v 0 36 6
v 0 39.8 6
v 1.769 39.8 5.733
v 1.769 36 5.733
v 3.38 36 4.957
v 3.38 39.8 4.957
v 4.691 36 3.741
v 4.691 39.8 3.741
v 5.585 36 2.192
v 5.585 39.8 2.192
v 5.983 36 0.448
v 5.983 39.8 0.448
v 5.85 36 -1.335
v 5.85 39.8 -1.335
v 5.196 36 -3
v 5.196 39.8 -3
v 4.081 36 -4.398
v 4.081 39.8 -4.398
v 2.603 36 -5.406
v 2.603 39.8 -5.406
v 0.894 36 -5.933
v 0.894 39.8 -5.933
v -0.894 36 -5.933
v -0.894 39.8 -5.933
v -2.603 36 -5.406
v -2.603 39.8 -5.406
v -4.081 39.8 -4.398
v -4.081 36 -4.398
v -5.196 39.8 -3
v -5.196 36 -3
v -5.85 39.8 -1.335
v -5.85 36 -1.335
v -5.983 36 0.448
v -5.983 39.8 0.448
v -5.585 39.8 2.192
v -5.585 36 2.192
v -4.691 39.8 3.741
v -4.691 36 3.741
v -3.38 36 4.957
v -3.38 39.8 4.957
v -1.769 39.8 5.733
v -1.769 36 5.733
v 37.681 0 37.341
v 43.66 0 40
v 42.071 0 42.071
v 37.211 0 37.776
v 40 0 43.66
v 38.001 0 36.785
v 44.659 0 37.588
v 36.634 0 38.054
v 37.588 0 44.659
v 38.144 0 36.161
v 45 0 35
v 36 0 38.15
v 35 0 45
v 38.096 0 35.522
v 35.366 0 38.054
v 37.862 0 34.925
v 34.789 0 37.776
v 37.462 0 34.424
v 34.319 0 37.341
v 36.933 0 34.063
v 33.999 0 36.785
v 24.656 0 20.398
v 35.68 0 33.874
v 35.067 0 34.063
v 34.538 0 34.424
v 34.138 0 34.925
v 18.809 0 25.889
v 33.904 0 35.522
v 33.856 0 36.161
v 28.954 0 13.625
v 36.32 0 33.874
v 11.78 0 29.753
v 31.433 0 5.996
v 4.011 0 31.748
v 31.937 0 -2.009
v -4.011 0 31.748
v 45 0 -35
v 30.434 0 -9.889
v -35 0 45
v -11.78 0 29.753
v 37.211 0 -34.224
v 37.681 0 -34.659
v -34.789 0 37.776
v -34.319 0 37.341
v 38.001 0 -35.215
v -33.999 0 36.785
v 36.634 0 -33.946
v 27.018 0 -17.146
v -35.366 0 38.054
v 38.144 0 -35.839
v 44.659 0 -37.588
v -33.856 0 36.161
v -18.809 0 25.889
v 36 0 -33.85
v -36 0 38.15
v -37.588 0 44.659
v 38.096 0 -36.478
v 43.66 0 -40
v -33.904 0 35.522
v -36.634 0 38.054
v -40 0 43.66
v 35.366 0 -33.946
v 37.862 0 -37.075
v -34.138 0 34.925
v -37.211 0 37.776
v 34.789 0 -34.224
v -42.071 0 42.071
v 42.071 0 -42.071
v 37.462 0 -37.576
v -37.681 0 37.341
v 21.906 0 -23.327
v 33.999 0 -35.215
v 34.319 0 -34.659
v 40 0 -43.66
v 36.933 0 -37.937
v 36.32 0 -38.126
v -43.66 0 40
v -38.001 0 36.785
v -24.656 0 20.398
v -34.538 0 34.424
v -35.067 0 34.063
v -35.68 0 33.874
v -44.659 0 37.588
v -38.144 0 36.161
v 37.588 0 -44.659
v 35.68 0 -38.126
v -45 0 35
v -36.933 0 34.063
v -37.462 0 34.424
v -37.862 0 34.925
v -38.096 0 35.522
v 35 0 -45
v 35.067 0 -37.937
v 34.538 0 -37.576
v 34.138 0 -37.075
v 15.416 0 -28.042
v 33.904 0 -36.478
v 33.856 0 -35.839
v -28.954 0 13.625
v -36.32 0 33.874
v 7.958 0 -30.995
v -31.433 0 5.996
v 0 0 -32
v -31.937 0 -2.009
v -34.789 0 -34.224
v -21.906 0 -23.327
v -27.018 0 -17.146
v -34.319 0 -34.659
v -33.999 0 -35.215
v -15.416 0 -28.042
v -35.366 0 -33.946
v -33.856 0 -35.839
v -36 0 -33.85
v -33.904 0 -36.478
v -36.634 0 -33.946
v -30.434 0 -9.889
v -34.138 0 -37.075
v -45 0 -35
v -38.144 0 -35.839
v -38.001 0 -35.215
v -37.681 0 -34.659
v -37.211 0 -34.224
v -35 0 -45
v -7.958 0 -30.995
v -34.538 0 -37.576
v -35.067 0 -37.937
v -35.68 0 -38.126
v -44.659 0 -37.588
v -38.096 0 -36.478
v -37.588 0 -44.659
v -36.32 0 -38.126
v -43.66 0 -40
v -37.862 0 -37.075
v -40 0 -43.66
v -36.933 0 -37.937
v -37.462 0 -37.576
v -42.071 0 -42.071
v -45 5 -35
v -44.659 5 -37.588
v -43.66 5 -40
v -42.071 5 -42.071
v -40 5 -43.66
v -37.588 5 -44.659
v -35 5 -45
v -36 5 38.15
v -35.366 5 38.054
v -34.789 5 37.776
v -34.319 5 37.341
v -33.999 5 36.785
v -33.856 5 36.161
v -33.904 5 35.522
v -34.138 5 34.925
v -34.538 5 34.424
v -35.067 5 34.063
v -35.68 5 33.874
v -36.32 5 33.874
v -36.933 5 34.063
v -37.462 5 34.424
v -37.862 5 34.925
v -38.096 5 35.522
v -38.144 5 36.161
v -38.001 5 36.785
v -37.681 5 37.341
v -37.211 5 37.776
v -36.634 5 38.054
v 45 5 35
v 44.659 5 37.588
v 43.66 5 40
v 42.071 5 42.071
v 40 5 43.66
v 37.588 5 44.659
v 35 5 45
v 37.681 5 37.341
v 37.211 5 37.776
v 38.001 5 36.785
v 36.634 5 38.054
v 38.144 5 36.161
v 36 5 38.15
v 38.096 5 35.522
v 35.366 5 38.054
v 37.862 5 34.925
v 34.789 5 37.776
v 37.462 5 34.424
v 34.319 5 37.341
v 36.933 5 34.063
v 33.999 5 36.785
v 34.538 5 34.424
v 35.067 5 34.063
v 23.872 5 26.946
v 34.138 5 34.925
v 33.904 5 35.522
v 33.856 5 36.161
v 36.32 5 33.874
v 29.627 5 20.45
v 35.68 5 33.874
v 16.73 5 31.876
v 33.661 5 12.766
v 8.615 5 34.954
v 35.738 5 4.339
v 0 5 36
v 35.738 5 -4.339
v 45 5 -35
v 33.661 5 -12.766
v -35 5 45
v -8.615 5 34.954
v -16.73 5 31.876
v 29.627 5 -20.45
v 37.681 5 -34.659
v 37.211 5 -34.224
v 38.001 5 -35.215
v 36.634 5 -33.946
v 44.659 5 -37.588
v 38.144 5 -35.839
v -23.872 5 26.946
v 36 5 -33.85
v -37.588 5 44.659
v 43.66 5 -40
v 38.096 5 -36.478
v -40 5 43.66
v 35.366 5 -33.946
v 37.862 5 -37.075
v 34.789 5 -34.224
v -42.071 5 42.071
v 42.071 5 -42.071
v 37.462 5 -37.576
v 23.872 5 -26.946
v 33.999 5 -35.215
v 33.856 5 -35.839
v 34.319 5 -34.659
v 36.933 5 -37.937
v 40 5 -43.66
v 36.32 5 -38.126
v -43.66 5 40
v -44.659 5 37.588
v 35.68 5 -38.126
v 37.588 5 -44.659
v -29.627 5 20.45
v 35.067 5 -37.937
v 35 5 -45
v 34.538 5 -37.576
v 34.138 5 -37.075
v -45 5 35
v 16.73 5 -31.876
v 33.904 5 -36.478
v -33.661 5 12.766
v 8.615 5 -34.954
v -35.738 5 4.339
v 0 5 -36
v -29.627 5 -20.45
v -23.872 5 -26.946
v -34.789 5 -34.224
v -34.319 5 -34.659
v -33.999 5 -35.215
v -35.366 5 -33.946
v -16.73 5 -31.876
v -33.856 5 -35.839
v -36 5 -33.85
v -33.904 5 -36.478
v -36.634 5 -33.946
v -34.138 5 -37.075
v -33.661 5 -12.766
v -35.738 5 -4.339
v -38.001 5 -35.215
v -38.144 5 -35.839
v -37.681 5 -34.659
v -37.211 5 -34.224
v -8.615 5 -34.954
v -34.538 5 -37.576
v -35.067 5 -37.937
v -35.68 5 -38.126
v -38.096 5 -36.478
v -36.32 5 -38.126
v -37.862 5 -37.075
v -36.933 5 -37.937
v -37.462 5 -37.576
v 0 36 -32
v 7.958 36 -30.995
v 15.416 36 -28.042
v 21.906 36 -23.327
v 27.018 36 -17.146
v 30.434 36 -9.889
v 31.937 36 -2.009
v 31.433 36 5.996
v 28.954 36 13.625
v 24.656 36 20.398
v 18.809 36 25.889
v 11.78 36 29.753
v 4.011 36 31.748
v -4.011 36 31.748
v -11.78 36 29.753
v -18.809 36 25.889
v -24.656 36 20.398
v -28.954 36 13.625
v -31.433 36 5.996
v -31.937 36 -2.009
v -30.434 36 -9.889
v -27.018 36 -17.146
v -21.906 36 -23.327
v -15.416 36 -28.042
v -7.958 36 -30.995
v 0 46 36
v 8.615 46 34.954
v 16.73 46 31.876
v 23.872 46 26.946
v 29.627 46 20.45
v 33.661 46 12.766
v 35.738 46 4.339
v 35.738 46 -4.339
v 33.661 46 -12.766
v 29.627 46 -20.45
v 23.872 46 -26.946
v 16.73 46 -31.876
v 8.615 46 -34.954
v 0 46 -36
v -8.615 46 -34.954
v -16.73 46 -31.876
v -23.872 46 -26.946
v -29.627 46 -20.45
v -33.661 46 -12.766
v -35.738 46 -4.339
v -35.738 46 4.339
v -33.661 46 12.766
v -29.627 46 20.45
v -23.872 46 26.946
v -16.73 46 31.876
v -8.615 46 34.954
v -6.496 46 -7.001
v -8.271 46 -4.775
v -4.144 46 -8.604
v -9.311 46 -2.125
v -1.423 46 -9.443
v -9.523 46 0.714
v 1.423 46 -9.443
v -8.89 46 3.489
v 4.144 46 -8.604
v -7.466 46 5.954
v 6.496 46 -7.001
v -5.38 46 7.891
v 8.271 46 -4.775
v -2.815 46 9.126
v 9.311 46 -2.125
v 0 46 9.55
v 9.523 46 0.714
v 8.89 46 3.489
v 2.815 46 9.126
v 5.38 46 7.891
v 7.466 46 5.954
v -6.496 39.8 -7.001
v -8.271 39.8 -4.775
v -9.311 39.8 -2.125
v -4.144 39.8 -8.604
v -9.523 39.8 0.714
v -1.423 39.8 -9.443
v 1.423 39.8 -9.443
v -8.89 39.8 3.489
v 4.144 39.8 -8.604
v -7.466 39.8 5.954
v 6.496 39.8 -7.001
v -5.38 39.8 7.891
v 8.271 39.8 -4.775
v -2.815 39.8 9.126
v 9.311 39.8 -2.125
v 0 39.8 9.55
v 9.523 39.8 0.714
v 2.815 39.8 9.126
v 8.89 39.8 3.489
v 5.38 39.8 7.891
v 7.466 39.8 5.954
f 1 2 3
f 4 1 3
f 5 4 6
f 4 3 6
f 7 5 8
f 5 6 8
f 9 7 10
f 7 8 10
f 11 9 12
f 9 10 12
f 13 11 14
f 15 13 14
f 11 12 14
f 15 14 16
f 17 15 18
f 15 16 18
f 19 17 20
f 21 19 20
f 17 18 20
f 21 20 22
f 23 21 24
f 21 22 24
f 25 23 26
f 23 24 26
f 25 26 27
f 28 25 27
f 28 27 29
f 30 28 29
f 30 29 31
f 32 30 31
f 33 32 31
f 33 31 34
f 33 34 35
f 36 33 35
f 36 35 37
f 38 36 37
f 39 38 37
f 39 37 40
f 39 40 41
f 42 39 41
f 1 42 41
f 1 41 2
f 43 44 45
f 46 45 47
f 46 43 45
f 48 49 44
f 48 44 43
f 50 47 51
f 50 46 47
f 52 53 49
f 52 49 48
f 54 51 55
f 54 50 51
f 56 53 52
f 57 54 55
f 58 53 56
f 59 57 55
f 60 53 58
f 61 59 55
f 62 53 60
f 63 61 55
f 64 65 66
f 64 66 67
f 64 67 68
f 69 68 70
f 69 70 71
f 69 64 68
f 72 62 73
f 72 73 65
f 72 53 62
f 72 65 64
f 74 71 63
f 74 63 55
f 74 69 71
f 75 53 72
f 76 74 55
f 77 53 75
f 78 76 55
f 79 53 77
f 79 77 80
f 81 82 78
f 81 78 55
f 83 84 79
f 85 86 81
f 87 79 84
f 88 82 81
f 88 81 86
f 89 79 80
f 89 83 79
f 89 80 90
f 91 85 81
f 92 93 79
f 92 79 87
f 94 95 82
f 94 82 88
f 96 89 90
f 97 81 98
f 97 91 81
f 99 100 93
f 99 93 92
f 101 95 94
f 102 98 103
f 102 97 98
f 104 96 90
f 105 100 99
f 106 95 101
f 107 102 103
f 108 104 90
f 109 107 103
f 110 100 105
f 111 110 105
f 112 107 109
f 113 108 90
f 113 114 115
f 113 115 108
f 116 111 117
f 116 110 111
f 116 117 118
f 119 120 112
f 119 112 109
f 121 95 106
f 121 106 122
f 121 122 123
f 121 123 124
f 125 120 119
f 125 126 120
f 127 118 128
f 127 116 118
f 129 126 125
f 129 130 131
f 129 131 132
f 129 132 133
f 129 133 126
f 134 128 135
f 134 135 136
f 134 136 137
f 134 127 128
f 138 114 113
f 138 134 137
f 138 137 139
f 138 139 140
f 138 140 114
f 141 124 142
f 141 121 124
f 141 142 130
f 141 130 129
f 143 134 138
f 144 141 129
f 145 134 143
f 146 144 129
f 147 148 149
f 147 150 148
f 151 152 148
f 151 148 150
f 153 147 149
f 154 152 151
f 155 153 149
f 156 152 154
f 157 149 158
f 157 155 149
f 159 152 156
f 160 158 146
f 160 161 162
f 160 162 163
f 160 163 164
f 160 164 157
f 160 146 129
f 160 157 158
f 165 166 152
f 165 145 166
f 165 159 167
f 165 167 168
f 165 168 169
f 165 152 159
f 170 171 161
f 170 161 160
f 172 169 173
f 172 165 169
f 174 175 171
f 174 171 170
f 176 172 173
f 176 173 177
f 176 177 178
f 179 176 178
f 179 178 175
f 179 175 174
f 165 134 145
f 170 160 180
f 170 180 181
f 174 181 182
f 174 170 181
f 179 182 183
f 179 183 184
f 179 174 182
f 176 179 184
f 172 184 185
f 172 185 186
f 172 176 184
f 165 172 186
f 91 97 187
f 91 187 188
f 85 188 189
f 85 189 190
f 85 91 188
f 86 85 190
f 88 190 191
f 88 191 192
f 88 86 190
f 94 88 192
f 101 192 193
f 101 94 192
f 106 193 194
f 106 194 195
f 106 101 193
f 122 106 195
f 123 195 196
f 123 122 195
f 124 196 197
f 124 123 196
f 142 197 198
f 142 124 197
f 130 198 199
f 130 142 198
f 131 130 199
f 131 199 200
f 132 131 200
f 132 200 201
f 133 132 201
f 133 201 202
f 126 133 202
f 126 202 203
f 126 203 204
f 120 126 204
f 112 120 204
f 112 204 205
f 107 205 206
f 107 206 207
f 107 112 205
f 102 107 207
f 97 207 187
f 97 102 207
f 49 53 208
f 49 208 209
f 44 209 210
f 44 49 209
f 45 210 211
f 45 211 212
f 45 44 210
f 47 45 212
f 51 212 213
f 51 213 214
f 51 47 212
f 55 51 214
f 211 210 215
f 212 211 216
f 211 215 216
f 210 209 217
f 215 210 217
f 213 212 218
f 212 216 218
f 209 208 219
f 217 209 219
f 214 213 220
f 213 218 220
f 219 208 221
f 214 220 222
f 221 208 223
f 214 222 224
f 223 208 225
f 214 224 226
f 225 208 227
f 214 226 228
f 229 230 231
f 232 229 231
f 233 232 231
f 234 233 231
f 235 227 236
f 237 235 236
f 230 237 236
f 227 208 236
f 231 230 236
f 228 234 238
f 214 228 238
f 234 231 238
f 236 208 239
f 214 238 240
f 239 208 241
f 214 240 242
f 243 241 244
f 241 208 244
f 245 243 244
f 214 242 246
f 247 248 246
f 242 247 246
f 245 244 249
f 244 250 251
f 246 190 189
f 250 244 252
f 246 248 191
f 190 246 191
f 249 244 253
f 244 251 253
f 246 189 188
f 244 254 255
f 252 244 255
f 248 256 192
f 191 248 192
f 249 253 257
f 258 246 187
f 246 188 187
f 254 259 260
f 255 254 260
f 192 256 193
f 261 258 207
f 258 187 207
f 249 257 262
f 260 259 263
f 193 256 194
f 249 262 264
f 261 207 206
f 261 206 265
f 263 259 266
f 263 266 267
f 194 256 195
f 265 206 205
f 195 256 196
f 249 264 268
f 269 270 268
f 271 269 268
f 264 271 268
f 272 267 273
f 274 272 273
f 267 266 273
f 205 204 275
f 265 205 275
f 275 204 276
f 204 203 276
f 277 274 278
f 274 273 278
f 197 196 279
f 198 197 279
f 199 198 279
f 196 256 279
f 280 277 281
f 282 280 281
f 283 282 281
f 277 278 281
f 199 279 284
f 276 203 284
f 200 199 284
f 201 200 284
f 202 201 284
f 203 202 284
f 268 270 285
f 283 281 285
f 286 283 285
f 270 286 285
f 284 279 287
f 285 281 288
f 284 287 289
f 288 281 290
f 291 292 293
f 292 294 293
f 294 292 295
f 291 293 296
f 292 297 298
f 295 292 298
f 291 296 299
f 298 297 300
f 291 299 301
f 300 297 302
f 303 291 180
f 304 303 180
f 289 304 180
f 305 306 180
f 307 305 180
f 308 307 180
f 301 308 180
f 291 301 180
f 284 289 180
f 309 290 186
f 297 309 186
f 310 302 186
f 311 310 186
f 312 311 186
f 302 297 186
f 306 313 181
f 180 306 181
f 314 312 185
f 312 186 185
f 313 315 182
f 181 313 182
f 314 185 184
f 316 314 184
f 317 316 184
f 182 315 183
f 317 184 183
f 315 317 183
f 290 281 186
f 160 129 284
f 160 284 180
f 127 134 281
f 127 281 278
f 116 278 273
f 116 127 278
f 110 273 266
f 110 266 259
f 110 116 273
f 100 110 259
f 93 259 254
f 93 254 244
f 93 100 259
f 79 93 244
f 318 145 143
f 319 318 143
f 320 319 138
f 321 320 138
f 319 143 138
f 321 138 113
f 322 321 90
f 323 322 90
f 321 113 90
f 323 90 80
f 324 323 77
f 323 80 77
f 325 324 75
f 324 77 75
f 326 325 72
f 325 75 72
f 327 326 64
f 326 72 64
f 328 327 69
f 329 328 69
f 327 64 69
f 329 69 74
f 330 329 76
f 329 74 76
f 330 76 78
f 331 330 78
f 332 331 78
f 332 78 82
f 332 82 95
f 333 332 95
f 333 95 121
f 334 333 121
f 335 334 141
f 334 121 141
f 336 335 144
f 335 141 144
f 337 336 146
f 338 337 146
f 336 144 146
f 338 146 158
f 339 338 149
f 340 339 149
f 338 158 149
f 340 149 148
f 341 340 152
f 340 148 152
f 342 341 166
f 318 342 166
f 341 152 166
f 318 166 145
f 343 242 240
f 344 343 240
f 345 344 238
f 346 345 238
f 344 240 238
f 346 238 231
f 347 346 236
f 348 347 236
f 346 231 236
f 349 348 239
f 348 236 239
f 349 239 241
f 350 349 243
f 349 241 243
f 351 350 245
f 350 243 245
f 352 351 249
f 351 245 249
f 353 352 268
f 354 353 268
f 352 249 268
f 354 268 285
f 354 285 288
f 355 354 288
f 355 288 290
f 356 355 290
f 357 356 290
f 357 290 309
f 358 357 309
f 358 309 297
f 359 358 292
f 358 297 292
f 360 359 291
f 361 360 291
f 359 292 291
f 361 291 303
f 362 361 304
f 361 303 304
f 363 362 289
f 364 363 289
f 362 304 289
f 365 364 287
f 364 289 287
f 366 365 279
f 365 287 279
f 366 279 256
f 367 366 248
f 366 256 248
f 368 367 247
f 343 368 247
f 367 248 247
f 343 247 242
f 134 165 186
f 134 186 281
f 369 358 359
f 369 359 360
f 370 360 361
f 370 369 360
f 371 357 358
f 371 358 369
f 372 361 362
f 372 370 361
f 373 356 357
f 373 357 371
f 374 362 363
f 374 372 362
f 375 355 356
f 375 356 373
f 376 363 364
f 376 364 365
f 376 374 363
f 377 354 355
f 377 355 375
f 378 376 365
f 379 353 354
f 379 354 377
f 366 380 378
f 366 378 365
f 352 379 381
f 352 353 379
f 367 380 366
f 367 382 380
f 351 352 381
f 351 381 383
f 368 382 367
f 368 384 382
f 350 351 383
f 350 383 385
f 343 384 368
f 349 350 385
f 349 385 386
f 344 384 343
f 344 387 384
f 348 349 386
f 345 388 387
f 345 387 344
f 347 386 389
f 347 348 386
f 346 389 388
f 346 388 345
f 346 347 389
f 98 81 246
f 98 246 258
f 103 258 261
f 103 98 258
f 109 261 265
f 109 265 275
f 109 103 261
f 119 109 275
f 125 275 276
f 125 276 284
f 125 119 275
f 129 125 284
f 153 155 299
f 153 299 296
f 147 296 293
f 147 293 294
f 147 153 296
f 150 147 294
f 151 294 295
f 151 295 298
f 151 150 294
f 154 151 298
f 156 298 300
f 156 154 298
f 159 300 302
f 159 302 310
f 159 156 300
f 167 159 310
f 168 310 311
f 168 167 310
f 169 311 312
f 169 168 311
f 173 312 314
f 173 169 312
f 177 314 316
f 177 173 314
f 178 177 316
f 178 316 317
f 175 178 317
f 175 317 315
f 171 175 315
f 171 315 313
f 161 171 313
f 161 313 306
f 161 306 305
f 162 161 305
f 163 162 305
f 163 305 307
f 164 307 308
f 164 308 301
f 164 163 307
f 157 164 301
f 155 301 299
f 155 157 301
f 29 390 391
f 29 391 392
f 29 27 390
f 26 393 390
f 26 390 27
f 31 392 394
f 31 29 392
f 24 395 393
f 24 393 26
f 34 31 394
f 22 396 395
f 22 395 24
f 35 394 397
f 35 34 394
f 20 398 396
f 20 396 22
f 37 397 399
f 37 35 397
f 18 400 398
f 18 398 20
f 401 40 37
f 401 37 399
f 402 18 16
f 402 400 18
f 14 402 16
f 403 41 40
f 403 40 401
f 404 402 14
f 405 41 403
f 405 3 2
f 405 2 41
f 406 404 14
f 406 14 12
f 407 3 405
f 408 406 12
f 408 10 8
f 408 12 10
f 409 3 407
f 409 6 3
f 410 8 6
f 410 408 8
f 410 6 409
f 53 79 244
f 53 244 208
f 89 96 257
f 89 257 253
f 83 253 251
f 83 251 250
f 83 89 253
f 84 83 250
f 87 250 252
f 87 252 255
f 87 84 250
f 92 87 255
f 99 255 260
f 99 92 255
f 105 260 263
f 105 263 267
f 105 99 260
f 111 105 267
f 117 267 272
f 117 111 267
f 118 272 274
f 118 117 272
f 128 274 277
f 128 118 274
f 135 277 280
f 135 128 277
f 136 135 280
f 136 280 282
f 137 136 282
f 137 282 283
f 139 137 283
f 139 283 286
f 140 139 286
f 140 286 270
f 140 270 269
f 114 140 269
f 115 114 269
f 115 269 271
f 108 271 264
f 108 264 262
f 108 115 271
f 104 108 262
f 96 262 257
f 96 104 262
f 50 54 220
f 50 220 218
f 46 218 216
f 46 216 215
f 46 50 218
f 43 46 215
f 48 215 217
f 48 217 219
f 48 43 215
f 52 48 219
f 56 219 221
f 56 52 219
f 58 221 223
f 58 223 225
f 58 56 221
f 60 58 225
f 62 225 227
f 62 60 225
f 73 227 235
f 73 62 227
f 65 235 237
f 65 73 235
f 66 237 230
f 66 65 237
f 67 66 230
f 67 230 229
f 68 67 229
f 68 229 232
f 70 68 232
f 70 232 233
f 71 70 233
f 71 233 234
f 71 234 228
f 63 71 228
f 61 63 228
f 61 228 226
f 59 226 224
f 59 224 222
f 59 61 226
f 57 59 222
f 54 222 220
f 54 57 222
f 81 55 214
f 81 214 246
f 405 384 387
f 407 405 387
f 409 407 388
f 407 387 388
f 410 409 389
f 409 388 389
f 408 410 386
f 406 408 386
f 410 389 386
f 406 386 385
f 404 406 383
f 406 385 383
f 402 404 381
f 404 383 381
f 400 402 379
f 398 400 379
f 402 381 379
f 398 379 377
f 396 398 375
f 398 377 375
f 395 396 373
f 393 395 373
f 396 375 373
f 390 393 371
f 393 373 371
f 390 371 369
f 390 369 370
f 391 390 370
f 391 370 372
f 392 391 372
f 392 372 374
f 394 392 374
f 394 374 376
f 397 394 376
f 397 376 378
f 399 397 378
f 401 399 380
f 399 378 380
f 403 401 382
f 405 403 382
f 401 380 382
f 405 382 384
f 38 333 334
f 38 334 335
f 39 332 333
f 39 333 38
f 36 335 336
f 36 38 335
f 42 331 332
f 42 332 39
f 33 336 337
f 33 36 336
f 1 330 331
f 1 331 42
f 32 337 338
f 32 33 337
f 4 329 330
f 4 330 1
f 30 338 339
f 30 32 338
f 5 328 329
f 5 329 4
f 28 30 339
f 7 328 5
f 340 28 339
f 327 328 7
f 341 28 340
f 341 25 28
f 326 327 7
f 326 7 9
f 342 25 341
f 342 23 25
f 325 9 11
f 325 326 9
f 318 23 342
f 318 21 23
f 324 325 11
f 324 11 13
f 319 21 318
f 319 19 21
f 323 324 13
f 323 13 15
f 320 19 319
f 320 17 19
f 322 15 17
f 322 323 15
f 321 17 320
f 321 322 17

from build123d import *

# Parameters (mm, degrees)
SKETCH3_R           = 2.15
BOSS_EXTRUDE1_DEPTH = 5
SKETCH4_R           = 36
BOSS_EXTRUDE2_DEPTH = 41
SKETCH5_R           = 9.55
CUT_EXTRUDE1_DEPTH  = 6.2
SKETCH6_R           = 32
CUT_EXTRUDE2_DEPTH  = 36
SKETCH8_R           = 6
CUT_EXTRUDE3_DEPTH  = 76.060242472


with BuildPart() as part:
    # Sketch3 → Boss-Extrude1 (new body)
    with BuildSketch(Plane(origin=(0, 0, 0), x_dir=(1, 0, 0), z_dir=(0, 1, 0))):
        with BuildLine():
            Line((-35, 45), (35, 45))
            ThreePointArc((35, 45), (42.071067812, 42.071067812), (45, 35))
            Line((45, 35), (45, -35))
            ThreePointArc((45, -35), (42.071067812, -42.071067812), (35, -45))
            Line((35, -45), (-35, -45))
            ThreePointArc((-35, -45), (-42.071067812, -42.071067812), (-45, -35))
            Line((-45, -35), (-45, 35))
            ThreePointArc((-45, 35), (-42.071067812, 42.071067812), (-35, 45))
        make_face()
        with Locations(Location((-36, 36, 0), (0, 0, 270))):
            Circle(SKETCH3_R, mode=Mode.SUBTRACT)
        with Locations(Location((36, 36, 0), (0, 0, 270))):
            Circle(SKETCH3_R, mode=Mode.SUBTRACT)
        with Locations(Location((36, -36, 0), (0, 0, 270))):
            Circle(SKETCH3_R, mode=Mode.SUBTRACT)
        with Locations(Location((-36, -36, 0), (0, 0, 270))):
            Circle(SKETCH3_R, mode=Mode.SUBTRACT)
    extrude(amount=BOSS_EXTRUDE1_DEPTH)

    # Sketch4 → Boss-Extrude2 (add)
    with BuildSketch(Plane(origin=(0, 5, 0), x_dir=(1, 0, 0), z_dir=(0, 1, 0))):
        with Locations(Location((0, 0, 0), (0, 0, 270))):
            Circle(SKETCH4_R)
    extrude(amount=BOSS_EXTRUDE2_DEPTH)

    # Sketch5 → Cut-Extrude1 (cut)
    with BuildSketch(Plane(origin=(0, 46, 0), x_dir=(1, 0, 0), z_dir=(0, 1, 0))):
        with Locations(Location((0, 0, 0), (0, 0, 270))):
            Circle(SKETCH5_R)
    extrude(amount=-CUT_EXTRUDE1_DEPTH, mode=Mode.SUBTRACT)

    # Sketch6 → Cut-Extrude2 (cut)
    with BuildSketch(Plane.XZ):
        with Locations(Location((0, 0, 0), (0, 0, 270))):
            Circle(SKETCH6_R)
    extrude(amount=-CUT_EXTRUDE2_DEPTH, mode=Mode.SUBTRACT)

    # Sketch8 → Cut-Extrude3 (cut, through all)
    with BuildSketch(Plane(origin=(0, 39.8, 0), x_dir=(1, 0, 0), z_dir=(0, 1, 0))):
        with Locations(Location((0, 0, 0), (0, 0, 270))):
            Circle(SKETCH8_R)
    extrude(amount=-CUT_EXTRUDE3_DEPTH, mode=Mode.SUBTRACT)


solid = part.part
